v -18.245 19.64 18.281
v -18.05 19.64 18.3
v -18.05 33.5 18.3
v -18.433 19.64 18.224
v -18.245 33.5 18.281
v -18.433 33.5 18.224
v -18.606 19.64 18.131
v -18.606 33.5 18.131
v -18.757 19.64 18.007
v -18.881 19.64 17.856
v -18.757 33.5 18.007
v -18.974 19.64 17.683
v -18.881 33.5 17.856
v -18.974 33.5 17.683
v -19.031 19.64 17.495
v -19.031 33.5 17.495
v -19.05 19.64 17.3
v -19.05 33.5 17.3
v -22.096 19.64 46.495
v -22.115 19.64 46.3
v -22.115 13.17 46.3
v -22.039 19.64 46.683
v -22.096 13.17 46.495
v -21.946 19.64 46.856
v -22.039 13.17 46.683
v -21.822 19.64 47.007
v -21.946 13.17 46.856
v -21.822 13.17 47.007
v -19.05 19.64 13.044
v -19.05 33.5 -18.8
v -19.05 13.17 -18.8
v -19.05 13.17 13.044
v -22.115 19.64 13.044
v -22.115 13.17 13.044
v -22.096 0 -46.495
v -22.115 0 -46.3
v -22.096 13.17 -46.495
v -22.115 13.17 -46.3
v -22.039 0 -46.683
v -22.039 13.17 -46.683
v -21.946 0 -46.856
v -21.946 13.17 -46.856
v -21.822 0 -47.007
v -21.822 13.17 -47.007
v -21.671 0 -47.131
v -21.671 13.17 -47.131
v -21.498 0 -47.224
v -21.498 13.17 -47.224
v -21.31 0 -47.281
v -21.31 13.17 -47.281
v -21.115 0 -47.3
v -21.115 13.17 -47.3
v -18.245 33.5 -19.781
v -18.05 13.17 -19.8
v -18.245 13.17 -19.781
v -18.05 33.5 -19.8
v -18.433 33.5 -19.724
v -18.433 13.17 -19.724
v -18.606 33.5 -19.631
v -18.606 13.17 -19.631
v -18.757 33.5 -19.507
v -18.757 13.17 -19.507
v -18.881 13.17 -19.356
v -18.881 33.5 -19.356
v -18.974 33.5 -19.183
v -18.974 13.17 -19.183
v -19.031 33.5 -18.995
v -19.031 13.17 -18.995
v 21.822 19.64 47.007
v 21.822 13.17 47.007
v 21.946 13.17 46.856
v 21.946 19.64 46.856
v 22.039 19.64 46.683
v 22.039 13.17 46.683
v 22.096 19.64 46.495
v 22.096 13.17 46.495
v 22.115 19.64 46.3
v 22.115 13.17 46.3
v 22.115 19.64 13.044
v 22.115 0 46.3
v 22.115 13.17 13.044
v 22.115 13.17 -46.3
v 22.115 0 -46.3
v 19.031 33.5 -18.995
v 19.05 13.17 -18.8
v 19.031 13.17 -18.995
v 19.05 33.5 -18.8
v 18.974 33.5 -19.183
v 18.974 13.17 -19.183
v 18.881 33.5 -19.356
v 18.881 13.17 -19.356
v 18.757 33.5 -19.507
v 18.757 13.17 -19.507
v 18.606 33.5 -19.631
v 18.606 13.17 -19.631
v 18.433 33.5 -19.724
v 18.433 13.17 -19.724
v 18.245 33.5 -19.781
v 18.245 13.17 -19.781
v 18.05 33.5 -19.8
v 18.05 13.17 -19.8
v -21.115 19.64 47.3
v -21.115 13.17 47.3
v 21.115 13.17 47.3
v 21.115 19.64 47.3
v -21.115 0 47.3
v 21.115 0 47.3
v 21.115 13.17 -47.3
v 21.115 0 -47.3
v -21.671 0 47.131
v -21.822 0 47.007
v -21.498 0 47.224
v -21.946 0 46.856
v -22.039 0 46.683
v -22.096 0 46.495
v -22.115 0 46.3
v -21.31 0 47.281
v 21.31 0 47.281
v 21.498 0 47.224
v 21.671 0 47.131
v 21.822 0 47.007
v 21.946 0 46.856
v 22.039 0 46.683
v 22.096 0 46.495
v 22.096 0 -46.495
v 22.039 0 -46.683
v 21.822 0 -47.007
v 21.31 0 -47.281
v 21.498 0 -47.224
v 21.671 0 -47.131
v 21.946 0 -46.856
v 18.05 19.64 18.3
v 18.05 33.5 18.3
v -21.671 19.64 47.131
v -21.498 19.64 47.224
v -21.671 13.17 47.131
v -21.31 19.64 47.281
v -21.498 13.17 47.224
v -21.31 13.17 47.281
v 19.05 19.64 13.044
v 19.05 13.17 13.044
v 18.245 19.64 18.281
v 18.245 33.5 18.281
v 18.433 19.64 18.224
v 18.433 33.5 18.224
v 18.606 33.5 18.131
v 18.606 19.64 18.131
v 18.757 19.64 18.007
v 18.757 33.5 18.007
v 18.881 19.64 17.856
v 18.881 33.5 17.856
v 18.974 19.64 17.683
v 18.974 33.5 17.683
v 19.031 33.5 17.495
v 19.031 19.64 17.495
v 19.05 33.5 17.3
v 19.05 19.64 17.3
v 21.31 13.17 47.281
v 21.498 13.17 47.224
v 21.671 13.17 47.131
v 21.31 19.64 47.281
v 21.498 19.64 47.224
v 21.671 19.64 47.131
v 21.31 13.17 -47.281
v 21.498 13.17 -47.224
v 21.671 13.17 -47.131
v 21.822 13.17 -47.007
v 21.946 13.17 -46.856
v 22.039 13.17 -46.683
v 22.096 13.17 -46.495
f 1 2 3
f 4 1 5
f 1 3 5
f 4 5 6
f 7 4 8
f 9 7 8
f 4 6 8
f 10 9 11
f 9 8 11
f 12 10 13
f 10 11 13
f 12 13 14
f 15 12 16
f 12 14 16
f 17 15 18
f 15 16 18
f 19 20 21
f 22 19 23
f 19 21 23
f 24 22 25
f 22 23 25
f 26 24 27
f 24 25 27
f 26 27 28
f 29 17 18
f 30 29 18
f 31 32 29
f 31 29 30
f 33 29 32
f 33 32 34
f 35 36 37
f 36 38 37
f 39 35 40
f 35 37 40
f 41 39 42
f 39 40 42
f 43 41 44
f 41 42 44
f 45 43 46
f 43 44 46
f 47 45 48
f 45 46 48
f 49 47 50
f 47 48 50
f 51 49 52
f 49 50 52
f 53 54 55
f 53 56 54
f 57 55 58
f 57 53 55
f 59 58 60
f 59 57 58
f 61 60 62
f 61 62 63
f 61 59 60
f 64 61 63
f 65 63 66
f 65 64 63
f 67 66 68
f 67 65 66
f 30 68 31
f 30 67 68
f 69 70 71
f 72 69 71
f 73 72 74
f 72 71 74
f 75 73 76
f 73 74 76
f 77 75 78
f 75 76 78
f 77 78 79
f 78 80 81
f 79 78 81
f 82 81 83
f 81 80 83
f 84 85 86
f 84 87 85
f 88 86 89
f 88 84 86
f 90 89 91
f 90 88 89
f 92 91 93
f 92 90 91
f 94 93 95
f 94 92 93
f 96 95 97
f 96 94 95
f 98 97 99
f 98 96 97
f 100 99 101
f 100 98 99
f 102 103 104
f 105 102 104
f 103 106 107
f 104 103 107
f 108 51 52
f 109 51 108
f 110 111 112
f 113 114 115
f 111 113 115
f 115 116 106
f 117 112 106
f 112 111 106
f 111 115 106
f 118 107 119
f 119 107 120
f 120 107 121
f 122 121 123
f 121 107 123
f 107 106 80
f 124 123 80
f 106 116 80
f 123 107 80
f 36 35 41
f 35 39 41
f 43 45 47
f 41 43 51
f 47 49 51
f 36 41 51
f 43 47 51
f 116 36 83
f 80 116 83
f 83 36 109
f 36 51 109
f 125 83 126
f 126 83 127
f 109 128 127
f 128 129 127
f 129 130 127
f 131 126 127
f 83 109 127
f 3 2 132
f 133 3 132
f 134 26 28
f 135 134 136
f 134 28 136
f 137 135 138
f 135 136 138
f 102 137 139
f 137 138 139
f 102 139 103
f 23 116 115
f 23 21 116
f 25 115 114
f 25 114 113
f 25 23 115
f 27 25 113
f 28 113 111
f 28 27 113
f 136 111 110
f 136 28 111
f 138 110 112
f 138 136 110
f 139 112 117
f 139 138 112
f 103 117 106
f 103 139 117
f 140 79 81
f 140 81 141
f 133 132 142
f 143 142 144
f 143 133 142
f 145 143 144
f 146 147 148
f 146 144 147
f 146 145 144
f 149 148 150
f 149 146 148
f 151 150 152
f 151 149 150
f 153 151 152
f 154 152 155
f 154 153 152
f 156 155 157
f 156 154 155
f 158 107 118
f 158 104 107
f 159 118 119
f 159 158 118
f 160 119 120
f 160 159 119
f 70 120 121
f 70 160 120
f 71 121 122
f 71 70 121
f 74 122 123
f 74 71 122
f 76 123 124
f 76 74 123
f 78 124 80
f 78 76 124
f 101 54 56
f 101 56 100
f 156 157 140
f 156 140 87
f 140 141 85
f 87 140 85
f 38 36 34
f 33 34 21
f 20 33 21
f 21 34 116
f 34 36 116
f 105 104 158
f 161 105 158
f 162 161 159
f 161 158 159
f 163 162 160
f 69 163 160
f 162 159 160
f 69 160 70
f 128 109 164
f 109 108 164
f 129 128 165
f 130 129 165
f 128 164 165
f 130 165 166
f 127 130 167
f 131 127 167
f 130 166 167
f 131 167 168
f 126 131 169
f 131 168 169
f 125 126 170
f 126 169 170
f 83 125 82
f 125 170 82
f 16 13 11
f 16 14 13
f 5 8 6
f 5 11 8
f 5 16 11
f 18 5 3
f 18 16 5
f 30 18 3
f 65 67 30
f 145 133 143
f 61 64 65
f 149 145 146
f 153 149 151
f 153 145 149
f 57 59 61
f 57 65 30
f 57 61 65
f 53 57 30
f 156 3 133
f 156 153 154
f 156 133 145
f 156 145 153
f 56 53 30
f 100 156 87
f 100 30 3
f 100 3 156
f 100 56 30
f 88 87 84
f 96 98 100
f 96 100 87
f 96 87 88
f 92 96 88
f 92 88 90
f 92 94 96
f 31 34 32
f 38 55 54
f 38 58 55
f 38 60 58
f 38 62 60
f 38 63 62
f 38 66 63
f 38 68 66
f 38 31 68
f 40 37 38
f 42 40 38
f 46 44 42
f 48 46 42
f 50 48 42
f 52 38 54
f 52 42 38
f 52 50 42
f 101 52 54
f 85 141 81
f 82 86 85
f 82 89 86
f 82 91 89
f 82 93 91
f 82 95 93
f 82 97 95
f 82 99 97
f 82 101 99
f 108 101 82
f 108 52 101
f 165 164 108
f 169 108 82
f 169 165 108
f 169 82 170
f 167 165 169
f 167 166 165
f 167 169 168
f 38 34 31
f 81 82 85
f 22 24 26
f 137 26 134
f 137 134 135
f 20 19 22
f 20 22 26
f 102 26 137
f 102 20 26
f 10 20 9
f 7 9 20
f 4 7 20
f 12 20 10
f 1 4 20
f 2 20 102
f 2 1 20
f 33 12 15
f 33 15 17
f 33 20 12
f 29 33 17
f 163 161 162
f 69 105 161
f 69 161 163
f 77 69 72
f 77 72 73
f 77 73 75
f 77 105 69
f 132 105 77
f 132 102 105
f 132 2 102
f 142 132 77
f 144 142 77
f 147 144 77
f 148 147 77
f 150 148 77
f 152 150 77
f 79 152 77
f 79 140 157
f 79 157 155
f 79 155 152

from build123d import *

# Parameters (mm, degrees)
SKETCH1_W           = 44.23
SKETCH1_H           = 94.6
BOSS_EXTRUDE1_DEPTH = 13.17
SKETCH2_W           = 38.1
SKETCH2_H           = 38.1
BOSS_EXTRUDE2_DEPTH = 20.33
FILLET1_R           = 1
BOSS_EXTRUDE3_DEPTH = 6.47


with BuildPart() as part:
    # Sketch1 → Boss-Extrude1 (new body)
    with BuildSketch(Plane(origin=(0, 0, 0), x_dir=(1, 0, 0), z_dir=(0, 1, 0))):
        Rectangle(SKETCH1_W, SKETCH1_H)
    extrude(amount=BOSS_EXTRUDE1_DEPTH)

    # Sketch2 → Boss-Extrude2 (add)
    with BuildSketch(Plane(origin=(0, 13.17, 0), x_dir=(1, 0, 0), z_dir=(0, 1, 0))):
        with Locations((0, 0.75)):
            Rectangle(SKETCH2_W, SKETCH2_H)
    extrude(amount=BOSS_EXTRUDE2_DEPTH)

    # Fillet1
    fillet1_edges = [part.edges().sort_by_distance(p)[0] for p in [
        (-19.05, 23.335, -19.8),
        (-19.05, 23.335, 18.3),
        (19.05, 23.335, 18.3),
        (19.05, 23.335, -19.8),
        (-22.115, 6.585, -47.3),
        (22.115, 6.585, -47.3),
        (22.115, 6.585, 47.3),
        (-22.115, 6.585, 47.3),
    ]]
    fillet(fillet1_edges, radius=FILLET1_R)

    # Sketch3 → Boss-Extrude3 (add)
    with BuildSketch(Plane(origin=(0, 13.17, 0), x_dir=(1, 0, 0), z_dir=(0, 1, 0))):
        with BuildLine():
            Line((-19.05, -13.043519039), (-22.115, -13.043519039))
            Line((-22.115, -13.043519039), (-22.115, -46.3))
            ThreePointArc((-22.115, -46.3), (-22.038879533, -46.682683432), (-21.822106781, -47.007106781))
            ThreePointArc((-21.822106781, -47.007106781), (-21.497683432, -47.223879533), (-21.115, -47.3))
            Line((-21.115, -47.3), (21.115, -47.3))
            ThreePointArc((21.115, -47.3), (21.497683432, -47.223879533), (21.822106781, -47.007106781))
            ThreePointArc((21.822106781, -47.007106781), (22.038879533, -46.682683432), (22.115, -46.3))
            Line((22.115, -46.3), (22.115, -17.3))
            Line((22.115, -17.3), (22.115, -13.043519039))
            Line((22.115, -13.043519039), (19.05, -13.043519039))
            Line((19.05, -13.043519039), (19.05, -17.3))
            ThreePointArc((19.05, -17.3), (18.973879533, -17.682683432), (18.757106781, -18.007106781))
            ThreePointArc((18.757106781, -18.007106781), (18.432683432, -18.223879533), (18.05, -18.3))
            Line((18.05, -18.3), (1.214814512, -18.3))
            Line((1.214814512, -18.3), (-18.05, -18.3))
            ThreePointArc((-18.05, -18.3), (-18.432683432, -18.223879533), (-18.757106781, -18.007106781))
            ThreePointArc((-18.757106781, -18.007106781), (-18.973879533, -17.682683432), (-19.05, -17.3))
            Line((-19.05, -17.3), (-19.05, -13.043519039))
        make_face()
    extrude(amount=BOSS_EXTRUDE3_DEPTH)


solid = part.part
